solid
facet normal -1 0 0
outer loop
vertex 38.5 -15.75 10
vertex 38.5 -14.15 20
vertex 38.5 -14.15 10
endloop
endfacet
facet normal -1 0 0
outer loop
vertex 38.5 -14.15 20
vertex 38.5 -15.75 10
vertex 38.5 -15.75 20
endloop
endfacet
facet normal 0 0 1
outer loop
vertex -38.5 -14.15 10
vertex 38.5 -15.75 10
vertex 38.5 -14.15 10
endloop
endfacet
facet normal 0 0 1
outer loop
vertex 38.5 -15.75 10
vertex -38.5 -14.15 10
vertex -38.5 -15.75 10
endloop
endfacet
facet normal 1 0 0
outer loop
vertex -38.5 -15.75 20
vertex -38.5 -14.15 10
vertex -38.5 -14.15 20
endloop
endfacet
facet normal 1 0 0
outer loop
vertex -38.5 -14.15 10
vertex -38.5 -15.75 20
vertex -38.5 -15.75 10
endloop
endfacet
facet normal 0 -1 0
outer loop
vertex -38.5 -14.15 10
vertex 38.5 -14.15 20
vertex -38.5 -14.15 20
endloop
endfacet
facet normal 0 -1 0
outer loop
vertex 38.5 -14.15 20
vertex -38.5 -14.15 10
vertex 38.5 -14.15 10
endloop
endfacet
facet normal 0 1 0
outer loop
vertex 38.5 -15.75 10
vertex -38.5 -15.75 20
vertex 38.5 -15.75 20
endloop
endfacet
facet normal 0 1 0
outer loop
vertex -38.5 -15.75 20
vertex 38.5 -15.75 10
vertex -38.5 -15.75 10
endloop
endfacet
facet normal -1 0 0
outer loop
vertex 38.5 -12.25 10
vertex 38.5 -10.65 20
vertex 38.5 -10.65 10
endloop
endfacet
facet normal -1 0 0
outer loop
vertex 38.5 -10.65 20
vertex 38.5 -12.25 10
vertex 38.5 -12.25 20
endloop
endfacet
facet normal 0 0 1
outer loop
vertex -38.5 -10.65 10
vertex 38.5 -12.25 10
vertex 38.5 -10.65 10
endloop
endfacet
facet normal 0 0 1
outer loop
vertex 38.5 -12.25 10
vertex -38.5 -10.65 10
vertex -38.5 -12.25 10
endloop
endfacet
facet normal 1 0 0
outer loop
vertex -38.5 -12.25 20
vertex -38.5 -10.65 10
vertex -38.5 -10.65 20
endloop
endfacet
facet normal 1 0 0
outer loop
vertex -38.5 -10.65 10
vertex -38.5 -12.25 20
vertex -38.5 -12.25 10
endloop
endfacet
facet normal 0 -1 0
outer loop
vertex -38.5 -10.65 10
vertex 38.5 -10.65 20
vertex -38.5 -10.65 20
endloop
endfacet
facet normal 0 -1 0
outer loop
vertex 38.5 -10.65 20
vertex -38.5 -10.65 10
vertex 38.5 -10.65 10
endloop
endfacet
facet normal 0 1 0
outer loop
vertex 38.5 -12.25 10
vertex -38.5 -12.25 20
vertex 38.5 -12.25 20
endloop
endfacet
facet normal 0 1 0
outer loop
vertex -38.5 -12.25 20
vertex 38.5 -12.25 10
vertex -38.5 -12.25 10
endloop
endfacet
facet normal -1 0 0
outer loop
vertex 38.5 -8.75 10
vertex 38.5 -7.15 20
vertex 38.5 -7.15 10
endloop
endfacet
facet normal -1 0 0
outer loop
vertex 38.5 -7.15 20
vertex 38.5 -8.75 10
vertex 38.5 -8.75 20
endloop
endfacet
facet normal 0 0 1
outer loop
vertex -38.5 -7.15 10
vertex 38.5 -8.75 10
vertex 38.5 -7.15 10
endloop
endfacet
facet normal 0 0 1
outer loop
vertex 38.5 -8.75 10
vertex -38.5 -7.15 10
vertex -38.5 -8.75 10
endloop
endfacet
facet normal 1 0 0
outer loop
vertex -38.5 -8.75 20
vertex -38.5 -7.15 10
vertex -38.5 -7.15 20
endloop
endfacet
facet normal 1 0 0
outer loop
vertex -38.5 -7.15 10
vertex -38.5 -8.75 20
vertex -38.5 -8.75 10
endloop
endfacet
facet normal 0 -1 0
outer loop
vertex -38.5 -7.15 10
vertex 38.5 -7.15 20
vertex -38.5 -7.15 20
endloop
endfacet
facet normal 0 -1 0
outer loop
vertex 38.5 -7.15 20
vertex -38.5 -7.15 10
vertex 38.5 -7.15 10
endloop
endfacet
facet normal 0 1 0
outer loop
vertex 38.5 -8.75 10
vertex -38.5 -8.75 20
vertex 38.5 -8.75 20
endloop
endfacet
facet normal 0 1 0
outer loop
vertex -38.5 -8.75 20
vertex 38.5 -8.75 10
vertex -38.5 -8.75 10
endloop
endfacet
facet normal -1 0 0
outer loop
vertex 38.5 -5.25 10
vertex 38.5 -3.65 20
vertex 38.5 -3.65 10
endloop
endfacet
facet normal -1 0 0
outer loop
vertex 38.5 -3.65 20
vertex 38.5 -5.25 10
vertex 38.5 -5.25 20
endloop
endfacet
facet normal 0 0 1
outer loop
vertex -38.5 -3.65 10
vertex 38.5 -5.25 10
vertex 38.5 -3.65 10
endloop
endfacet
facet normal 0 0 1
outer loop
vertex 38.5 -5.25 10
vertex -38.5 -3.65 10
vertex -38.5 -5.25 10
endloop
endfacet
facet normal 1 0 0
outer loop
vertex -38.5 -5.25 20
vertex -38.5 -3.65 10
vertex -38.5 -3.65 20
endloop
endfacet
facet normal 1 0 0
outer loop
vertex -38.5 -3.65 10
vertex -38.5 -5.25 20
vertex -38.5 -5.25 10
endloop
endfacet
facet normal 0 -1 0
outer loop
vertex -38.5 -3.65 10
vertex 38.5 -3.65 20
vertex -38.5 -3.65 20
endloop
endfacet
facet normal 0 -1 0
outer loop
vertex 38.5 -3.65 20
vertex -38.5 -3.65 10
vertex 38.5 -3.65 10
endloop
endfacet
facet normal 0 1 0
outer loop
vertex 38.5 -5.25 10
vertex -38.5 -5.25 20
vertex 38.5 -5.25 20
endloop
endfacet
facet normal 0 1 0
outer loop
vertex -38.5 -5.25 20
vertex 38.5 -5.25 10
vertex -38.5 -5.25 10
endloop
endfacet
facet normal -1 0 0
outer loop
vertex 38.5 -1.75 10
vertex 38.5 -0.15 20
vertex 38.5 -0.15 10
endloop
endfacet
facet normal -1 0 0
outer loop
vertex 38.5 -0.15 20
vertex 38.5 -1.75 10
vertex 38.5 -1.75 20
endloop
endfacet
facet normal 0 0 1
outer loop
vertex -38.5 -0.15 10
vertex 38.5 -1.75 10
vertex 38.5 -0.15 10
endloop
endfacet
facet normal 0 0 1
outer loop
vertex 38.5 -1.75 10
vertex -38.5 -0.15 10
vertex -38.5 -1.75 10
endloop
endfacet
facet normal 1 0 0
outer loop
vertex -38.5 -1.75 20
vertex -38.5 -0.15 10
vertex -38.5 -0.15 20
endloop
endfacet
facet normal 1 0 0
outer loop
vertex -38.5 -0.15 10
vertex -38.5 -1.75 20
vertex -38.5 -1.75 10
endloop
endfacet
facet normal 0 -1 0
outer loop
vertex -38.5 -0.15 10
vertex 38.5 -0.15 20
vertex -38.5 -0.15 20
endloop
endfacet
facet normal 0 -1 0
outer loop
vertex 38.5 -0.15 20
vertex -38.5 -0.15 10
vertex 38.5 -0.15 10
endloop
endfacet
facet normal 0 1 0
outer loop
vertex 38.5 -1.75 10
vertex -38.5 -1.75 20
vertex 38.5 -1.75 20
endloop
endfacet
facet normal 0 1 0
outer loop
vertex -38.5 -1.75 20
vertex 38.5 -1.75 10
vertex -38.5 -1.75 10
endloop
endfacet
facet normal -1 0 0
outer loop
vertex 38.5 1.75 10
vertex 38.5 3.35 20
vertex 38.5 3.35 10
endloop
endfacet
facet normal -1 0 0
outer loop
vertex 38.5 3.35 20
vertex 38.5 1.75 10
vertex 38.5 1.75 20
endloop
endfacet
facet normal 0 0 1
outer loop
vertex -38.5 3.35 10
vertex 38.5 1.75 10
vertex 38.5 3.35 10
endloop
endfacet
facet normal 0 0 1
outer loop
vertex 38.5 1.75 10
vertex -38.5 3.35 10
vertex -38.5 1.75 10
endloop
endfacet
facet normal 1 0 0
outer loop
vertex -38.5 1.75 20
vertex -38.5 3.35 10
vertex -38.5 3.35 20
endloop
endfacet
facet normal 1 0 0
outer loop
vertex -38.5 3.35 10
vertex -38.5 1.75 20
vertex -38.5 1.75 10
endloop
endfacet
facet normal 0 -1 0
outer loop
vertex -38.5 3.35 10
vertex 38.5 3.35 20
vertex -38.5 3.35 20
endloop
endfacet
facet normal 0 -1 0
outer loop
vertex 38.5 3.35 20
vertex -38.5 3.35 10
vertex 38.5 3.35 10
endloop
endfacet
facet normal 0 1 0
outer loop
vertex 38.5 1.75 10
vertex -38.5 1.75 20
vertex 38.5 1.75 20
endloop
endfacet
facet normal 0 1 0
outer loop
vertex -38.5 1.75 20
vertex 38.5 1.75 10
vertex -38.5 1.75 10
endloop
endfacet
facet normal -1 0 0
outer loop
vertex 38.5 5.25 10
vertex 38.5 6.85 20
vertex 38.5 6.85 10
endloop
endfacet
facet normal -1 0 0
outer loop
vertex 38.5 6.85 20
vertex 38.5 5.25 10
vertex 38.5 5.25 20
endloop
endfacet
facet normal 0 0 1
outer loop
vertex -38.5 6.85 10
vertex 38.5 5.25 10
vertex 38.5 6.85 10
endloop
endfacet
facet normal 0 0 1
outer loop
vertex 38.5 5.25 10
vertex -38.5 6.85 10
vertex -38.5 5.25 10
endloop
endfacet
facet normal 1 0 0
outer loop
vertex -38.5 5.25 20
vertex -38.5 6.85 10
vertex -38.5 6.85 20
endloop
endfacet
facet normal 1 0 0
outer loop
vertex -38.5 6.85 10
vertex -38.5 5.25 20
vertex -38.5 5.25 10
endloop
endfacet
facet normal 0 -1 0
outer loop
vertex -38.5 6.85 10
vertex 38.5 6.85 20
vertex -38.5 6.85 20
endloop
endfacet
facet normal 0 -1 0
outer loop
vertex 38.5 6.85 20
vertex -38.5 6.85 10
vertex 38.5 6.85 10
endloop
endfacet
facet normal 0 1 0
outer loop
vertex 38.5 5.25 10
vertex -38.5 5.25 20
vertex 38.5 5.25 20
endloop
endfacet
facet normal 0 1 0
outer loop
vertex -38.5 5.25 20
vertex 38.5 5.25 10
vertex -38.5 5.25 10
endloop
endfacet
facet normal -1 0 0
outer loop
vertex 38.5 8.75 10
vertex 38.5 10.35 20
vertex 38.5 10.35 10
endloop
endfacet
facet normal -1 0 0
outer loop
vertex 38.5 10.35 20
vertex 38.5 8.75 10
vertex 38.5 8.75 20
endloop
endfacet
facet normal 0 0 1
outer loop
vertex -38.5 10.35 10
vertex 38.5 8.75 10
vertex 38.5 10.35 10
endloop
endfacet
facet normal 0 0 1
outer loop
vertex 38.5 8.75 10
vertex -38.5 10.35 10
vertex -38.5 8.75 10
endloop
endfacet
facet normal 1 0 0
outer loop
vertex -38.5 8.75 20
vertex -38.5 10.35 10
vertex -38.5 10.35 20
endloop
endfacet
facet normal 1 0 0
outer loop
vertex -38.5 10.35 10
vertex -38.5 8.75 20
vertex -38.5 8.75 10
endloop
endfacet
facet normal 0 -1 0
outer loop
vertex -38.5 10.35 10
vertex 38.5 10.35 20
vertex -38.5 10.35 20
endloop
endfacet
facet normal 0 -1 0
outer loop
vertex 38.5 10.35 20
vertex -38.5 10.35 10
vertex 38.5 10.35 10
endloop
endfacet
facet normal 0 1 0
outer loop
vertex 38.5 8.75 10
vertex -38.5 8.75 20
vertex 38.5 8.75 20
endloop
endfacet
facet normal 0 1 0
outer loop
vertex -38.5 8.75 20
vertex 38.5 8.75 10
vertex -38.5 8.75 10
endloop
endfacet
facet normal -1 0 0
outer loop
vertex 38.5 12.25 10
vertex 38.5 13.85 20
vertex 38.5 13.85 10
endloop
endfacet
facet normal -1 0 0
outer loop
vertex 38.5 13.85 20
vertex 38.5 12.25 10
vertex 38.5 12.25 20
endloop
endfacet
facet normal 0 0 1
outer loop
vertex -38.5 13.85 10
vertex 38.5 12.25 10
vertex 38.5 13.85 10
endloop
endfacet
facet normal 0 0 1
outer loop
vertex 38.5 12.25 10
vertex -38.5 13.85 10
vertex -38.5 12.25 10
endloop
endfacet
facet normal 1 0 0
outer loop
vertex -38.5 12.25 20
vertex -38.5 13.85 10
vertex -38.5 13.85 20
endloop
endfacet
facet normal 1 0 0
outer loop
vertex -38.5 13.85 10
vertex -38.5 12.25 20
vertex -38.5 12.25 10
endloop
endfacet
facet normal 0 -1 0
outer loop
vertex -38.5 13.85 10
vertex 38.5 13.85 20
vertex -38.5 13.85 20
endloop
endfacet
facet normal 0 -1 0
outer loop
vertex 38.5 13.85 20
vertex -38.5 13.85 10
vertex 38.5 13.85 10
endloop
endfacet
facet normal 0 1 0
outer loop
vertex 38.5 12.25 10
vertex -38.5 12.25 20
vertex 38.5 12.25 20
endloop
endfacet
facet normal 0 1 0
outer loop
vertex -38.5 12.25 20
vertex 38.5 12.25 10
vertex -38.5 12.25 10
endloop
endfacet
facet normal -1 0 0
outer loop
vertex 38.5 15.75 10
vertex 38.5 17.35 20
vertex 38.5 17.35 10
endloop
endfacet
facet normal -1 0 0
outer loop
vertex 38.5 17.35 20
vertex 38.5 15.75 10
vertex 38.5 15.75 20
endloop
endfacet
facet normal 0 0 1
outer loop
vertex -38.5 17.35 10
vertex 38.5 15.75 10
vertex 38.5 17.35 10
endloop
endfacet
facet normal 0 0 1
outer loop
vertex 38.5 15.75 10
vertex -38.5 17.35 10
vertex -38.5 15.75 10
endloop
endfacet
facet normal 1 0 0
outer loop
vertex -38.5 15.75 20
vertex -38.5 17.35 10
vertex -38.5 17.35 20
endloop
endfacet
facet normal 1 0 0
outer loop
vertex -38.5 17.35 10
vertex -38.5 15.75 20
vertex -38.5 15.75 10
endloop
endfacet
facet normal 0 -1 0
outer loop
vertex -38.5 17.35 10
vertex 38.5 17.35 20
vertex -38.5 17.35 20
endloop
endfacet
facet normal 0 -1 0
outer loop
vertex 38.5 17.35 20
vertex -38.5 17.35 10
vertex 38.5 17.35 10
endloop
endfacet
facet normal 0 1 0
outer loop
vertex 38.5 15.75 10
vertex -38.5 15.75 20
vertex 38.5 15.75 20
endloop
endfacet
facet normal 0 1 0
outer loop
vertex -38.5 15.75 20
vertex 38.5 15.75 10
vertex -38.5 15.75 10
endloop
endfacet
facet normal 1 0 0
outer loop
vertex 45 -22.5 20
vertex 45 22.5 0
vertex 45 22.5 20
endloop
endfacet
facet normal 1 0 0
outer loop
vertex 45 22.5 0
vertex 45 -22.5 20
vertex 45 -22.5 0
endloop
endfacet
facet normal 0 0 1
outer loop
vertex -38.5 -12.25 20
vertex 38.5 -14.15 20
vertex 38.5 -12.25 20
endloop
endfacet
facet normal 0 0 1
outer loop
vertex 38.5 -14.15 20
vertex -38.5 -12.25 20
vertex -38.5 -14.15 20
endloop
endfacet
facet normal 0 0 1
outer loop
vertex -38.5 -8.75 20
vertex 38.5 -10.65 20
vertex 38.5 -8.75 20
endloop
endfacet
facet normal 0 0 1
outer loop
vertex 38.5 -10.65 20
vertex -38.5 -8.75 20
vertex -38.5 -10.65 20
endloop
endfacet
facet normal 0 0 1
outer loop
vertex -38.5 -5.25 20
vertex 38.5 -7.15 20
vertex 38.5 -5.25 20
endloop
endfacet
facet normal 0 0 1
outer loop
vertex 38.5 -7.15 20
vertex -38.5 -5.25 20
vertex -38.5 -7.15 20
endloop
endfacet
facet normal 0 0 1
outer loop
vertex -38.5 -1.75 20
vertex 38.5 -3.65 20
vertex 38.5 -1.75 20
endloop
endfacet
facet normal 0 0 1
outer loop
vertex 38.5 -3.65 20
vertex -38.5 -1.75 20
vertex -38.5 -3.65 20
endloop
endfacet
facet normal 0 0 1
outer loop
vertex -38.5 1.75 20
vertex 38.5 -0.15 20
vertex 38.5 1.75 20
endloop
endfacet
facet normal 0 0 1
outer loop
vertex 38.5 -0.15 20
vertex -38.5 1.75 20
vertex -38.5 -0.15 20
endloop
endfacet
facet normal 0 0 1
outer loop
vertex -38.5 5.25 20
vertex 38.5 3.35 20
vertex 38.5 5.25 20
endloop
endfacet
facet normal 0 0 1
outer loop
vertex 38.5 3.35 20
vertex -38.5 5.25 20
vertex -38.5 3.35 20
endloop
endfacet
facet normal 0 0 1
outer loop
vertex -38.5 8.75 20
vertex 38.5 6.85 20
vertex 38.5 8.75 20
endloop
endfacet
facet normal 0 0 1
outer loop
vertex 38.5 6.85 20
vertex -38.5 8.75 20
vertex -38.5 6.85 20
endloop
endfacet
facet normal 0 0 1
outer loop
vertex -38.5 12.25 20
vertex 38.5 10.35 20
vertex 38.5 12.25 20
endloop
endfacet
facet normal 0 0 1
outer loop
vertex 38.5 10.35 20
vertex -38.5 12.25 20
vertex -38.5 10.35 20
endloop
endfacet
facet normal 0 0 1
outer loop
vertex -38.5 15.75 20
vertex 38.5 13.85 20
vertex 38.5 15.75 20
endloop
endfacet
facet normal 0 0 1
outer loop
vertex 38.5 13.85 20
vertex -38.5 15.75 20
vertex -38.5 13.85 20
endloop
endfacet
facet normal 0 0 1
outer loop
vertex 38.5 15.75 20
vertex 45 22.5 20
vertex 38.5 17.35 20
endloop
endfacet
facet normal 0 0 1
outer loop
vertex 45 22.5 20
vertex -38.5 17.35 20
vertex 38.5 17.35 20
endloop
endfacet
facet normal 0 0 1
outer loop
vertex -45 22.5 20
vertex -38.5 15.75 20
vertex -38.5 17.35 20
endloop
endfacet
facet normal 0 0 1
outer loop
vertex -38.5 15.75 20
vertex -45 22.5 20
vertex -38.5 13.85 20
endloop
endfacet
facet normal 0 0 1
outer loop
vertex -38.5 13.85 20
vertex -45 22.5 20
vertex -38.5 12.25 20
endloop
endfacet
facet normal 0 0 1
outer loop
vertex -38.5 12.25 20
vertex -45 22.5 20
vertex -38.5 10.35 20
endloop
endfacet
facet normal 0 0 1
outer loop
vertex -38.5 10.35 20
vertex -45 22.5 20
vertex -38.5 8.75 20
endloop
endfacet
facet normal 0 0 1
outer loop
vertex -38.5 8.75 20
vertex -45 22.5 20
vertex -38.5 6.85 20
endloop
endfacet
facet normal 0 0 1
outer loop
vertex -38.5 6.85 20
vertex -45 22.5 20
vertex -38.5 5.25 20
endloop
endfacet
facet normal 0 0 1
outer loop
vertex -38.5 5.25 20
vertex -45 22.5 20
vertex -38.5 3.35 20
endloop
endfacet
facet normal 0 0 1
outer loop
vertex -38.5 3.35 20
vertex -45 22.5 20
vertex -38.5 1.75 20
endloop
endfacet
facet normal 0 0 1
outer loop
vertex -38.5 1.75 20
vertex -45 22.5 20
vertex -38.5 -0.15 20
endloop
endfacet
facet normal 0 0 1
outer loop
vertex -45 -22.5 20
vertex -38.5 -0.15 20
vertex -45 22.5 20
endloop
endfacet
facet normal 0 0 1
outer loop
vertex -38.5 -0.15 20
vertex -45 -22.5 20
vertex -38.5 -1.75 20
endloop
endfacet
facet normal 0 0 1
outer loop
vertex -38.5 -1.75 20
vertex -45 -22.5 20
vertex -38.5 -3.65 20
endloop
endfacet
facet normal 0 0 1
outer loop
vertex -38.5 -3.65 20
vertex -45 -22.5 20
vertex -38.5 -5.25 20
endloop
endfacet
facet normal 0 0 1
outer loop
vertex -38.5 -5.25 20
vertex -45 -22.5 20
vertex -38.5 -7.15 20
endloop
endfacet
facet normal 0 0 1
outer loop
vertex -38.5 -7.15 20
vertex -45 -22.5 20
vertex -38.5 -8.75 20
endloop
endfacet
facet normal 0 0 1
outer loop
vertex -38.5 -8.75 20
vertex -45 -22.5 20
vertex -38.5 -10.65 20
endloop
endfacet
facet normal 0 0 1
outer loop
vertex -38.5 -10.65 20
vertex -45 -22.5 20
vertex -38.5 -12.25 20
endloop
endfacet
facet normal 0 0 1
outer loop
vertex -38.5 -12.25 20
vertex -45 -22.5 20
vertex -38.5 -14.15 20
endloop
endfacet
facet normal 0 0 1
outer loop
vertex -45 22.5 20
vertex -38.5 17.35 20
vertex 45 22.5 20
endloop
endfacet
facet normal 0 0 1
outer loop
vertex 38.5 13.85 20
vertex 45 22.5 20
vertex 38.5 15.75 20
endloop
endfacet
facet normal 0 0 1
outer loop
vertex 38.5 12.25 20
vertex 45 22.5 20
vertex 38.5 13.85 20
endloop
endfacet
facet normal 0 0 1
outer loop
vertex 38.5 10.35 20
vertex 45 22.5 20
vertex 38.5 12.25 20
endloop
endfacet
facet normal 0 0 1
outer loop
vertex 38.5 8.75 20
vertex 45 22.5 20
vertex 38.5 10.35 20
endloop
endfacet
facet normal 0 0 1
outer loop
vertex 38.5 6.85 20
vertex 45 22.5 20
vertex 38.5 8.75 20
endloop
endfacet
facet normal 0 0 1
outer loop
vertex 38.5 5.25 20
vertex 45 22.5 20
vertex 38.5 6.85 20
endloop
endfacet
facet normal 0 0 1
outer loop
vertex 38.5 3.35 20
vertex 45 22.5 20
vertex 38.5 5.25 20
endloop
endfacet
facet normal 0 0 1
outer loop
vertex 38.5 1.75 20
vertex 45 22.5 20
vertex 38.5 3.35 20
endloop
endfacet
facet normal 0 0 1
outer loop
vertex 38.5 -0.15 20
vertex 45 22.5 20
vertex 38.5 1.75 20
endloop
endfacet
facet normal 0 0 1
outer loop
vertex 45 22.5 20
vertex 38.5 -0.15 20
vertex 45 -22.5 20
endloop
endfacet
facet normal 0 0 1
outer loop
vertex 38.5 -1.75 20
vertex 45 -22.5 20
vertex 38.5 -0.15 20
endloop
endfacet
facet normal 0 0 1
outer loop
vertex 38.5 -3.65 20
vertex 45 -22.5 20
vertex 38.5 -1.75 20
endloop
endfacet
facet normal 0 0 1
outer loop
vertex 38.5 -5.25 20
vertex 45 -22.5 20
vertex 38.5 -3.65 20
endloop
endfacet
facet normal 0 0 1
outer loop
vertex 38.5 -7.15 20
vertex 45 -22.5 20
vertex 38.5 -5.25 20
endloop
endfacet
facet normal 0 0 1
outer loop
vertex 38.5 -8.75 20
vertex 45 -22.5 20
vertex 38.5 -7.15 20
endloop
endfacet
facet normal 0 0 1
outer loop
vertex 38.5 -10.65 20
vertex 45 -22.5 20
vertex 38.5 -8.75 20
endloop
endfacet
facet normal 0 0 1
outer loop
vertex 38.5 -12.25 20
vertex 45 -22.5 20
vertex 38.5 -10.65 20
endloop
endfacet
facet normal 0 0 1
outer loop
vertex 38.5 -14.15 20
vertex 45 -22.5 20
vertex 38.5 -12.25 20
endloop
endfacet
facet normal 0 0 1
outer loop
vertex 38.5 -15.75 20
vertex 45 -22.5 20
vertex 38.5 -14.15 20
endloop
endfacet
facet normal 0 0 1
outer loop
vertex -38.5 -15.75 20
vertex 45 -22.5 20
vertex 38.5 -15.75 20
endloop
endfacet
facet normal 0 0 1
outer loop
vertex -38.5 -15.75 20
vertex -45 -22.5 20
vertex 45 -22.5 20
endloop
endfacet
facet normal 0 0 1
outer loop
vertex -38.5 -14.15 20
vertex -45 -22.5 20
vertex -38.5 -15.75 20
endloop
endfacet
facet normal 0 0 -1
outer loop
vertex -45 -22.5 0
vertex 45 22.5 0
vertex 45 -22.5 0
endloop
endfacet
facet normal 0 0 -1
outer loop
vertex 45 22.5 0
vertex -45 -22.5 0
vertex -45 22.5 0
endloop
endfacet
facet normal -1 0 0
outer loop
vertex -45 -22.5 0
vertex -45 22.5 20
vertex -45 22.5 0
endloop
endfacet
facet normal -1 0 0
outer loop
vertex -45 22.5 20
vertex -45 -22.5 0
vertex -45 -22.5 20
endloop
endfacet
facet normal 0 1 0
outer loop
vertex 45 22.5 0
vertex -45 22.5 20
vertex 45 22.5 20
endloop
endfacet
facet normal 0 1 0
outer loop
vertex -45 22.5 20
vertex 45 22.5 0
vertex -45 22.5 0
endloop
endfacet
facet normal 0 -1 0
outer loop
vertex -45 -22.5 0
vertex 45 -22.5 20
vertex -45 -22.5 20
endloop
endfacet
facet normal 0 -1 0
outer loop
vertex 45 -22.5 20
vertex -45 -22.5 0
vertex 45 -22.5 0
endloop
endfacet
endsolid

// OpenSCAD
// Microscope slide drying rack
// Print orientation: base block on XY plane, slots open upward (+Z)

// ---------------- Parameters ----------------
block_len    = 90;    // block length along X (mm)
block_wid    = 45;    // block width along Y (mm)
block_ht     = 20;    // block height along Z (mm)

slot_count   = 10;    // number of slide slots
slot_len     = 77;    // slot length along X (mm)
slot_wid     = 1.6;   // slot width along Y (mm)
slot_depth   = 10;    // slot depth from top face (mm)
slot_pitch   = 3.5;   // centre-to-centre slot spacing along Y (mm)

eps          = 0.5;   // overcut past faces to avoid coplanar surfaces (mm)

$fn = 64;

// ---------------- Derived ----------------
slot_group_wid = (slot_count - 1) * slot_pitch;   // span of slots (first to last centre)
y_start        = -(slot_group_wid / 2);           // first slot centre Y (centres group)

// ---------------- Model ----------------
difference() {
    // Solid base block
    translate([-block_len / 2, -block_wid / 2, 0])
        cube([block_len, block_wid, block_ht]);

    // Parallel slots running along X, open at the top
    for (i = [0 : slot_count - 1]) {
        translate([-(slot_len / 2), y_start + i * slot_pitch, block_ht - slot_depth])
            cube([slot_len, slot_wid, slot_depth + eps]);
    }
}
